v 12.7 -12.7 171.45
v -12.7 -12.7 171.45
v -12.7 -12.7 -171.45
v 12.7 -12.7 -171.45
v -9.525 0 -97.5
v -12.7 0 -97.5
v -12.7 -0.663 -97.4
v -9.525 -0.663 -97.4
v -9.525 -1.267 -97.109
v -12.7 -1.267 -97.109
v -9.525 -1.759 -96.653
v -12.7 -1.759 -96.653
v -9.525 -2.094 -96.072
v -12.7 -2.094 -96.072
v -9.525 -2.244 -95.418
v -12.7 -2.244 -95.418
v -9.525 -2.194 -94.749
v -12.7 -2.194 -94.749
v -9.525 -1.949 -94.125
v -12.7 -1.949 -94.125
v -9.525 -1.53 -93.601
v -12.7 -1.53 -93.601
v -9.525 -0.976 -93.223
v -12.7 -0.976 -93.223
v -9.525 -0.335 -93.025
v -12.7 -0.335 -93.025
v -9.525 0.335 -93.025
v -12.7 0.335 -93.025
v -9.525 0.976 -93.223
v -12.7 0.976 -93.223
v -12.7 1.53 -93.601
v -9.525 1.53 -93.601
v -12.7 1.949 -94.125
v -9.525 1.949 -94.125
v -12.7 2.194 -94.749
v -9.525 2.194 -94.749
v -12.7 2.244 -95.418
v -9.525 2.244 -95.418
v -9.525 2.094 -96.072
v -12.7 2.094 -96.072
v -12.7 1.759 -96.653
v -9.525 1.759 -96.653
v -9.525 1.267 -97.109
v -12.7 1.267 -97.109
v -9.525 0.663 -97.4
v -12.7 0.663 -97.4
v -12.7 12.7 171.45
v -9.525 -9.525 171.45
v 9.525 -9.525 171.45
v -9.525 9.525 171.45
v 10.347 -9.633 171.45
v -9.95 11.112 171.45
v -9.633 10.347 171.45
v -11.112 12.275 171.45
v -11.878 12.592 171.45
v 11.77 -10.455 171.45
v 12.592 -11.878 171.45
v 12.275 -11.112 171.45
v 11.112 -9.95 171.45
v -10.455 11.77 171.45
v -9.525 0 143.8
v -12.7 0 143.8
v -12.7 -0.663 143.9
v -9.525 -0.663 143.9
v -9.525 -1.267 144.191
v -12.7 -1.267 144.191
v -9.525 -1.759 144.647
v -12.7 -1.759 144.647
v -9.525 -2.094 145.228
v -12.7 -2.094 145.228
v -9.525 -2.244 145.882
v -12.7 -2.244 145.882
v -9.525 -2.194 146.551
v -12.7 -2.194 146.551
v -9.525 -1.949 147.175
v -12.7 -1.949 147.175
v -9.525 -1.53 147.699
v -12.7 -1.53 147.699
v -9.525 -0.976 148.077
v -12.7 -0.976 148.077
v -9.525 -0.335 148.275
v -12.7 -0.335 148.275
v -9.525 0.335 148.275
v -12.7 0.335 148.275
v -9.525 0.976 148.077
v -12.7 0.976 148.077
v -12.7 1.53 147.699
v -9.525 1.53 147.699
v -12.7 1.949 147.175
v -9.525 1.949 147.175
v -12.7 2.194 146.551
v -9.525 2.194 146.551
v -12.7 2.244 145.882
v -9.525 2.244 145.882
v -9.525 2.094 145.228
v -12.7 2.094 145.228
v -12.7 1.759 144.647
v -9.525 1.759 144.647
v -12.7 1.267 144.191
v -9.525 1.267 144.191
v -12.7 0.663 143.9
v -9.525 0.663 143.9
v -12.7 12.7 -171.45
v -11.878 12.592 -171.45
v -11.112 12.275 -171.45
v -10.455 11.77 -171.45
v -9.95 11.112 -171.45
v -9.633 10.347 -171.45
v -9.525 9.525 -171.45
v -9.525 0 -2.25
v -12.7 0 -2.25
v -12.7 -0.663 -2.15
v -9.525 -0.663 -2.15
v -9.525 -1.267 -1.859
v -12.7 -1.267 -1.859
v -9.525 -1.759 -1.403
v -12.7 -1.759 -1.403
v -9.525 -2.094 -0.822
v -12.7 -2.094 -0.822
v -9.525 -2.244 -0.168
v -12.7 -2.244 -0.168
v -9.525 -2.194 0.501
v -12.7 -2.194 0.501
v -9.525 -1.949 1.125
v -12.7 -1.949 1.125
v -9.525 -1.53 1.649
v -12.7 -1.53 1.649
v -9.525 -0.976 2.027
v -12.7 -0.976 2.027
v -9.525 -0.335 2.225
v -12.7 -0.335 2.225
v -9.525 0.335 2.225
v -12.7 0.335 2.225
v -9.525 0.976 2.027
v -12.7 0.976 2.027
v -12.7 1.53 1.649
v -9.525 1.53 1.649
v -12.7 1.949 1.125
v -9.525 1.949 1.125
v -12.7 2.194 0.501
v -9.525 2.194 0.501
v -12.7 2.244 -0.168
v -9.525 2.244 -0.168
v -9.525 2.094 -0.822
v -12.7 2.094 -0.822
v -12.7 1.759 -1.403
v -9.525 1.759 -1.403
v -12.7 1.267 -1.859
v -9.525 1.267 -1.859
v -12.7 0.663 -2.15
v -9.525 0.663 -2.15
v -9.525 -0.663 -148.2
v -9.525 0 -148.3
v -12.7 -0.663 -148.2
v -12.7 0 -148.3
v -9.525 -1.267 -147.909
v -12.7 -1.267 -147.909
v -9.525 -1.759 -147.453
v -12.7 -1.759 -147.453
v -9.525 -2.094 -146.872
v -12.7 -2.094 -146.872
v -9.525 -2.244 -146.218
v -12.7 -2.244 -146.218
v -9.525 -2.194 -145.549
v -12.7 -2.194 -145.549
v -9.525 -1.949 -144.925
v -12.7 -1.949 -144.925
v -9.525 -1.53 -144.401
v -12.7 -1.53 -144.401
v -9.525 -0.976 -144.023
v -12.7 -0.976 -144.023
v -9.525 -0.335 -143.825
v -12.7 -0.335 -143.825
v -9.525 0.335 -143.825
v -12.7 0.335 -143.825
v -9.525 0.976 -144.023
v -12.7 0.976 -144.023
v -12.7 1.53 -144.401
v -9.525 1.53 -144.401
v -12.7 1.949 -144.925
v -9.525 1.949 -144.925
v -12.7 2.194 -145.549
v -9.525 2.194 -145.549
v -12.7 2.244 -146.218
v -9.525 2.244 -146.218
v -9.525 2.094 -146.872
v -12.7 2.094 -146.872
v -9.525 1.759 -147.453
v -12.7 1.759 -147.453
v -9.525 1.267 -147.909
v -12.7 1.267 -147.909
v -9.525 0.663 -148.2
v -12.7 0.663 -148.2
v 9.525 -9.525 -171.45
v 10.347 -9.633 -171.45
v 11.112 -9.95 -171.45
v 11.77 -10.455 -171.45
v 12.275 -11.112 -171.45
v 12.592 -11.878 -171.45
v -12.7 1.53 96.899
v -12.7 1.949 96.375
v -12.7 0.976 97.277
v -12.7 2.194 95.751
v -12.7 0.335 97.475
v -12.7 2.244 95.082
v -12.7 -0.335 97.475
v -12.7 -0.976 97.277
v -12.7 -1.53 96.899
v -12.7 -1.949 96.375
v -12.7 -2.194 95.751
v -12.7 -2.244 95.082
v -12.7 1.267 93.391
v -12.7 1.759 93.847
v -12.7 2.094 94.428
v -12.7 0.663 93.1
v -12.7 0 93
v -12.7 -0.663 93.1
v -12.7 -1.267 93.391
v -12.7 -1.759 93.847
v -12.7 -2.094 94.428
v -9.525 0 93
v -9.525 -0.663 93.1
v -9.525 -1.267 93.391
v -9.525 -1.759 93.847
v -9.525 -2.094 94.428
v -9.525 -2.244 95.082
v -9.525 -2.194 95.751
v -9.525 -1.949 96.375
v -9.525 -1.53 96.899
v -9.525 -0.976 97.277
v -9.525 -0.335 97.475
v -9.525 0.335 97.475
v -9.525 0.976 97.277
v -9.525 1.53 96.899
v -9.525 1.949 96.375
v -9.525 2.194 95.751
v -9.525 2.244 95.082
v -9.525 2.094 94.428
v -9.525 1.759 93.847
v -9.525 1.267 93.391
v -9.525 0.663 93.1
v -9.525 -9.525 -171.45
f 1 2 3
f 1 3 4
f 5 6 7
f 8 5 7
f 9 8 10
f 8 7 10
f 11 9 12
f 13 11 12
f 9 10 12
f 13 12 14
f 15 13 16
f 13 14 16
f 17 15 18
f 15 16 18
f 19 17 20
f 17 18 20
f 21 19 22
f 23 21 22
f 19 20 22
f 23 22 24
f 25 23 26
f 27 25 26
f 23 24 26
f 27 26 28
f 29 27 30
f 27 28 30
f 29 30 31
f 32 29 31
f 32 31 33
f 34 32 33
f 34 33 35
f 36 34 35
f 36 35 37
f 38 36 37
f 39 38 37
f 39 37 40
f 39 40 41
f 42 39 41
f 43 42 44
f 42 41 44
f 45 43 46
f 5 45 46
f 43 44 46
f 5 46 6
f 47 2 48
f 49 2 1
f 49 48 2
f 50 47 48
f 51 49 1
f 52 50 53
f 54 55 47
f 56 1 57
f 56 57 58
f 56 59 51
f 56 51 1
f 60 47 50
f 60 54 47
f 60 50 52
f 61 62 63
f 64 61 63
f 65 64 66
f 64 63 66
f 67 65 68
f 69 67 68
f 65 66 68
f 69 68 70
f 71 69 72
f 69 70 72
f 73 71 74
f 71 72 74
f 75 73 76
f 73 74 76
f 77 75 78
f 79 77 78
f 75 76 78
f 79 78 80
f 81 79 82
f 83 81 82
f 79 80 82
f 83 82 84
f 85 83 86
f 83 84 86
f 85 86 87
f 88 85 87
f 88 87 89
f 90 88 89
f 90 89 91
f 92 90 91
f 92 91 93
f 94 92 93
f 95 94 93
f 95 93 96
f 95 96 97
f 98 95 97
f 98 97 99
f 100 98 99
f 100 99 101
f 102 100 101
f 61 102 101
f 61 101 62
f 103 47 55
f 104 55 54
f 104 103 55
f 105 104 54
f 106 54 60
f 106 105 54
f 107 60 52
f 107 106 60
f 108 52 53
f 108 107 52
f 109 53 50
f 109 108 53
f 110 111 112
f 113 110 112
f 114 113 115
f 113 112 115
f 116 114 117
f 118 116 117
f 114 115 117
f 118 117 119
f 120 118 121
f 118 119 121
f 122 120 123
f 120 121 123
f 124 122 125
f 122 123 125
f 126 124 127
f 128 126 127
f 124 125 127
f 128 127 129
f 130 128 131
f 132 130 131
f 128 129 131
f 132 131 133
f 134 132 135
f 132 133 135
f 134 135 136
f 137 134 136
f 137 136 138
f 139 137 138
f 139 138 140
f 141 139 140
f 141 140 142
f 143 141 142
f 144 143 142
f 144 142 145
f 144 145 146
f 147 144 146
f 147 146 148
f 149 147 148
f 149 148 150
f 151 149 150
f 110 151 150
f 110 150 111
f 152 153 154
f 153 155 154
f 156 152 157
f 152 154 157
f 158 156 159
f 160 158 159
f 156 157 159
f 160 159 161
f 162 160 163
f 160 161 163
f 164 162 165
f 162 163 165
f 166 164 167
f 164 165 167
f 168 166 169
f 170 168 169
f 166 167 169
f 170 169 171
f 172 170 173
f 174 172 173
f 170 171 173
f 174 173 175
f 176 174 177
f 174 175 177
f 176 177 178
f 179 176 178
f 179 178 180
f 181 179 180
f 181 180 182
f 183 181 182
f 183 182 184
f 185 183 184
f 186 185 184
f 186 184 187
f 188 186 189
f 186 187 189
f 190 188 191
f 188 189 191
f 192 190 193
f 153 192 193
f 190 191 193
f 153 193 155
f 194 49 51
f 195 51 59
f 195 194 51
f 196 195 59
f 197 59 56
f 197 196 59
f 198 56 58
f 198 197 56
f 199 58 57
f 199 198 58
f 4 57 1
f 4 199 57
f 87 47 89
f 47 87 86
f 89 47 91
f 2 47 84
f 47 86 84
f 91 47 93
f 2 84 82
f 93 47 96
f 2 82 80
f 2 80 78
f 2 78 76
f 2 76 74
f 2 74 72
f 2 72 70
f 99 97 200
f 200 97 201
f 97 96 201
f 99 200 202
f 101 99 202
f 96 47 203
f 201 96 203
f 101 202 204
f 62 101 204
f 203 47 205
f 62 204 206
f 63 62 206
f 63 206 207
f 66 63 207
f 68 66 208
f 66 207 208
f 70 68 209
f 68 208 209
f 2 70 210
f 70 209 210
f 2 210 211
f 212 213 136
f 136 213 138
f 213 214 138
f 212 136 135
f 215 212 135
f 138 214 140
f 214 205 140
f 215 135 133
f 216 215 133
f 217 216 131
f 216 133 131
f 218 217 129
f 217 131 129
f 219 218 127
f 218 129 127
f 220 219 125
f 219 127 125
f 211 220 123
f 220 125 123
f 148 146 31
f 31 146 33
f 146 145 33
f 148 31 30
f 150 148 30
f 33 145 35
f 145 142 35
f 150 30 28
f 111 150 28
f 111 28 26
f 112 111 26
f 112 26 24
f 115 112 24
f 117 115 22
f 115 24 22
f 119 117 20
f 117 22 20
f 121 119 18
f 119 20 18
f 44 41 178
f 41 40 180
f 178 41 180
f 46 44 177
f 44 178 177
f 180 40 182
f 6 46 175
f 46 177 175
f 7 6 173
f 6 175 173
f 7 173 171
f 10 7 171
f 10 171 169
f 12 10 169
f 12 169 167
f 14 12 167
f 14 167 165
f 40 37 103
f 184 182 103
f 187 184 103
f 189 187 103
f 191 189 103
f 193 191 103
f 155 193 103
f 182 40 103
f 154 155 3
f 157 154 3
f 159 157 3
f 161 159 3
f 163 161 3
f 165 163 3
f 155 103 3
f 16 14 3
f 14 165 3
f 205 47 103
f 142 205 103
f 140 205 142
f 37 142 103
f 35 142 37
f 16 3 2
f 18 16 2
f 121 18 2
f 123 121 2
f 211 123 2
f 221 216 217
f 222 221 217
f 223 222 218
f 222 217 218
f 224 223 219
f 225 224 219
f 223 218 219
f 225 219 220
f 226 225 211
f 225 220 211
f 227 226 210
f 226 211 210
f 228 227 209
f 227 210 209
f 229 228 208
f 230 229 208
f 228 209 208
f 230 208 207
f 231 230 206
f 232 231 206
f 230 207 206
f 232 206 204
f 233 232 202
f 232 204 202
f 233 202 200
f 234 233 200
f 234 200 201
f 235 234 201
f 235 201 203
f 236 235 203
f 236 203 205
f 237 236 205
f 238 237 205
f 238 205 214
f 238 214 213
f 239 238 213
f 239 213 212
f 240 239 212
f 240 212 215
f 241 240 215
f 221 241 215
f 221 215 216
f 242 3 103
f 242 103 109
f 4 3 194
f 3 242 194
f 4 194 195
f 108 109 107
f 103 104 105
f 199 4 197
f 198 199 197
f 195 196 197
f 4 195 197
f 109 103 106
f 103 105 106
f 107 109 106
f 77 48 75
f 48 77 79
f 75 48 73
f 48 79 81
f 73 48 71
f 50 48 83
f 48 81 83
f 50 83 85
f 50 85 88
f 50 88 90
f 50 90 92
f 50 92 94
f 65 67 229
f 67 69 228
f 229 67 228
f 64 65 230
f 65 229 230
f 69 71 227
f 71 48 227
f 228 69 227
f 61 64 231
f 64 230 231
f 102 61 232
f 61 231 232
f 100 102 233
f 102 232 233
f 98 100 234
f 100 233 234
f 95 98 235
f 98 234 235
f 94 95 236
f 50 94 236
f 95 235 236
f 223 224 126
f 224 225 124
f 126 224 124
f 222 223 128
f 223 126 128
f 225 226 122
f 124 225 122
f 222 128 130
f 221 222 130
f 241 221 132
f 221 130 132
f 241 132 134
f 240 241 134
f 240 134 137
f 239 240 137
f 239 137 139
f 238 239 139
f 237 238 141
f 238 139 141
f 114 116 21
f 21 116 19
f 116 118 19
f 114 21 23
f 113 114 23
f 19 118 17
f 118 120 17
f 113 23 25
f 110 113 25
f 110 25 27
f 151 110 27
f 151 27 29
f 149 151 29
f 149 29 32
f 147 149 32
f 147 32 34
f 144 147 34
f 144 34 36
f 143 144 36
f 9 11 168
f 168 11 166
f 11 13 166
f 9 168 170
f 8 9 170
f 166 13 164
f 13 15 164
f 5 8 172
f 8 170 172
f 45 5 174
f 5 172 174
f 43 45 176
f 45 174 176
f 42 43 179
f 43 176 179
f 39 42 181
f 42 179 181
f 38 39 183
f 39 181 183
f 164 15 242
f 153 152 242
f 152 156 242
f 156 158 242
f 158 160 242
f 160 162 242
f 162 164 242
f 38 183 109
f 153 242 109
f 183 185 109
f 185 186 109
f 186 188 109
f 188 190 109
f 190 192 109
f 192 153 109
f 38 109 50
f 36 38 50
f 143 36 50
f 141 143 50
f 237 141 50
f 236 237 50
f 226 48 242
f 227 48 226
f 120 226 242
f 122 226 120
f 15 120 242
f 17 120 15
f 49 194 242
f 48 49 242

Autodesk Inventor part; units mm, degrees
ref_plane "YZ Plane" through (0, 0, 0) normal (1, 0, 0) x (0, 1, 0)
ref_plane "XZ Plane" through (0, 0, 0) normal (0, 1, 0) x (-1, 0, 0)
ref_plane "XY Plane" through (0, 0, 0) normal (0, 0, 1) x (1, 0, 0)
sketch "Sketch1" plane through (0, 0, 0) normal (0, 0, 1) x (1, 0, 0)
  line L0 (-12.7, -12.7) -> (12.7, -12.7)
  line L1 (12.7, -12.7) -> (12.7, 12.7)
  line L2 (12.7, 12.7) -> (-12.7, 12.7)
  line L3 (-12.7, 12.7) -> (-12.7, -12.7)
  line L4 (-9.525, 9.525) -> (9.525, 9.525)
  line L5 (9.525, 9.525) -> (9.525, -9.525)
  line L6 (9.525, -9.525) -> (-9.525, -9.525)
  line L7 (-9.525, -9.525) -> (-9.525, 9.525)
  arc A0 (-9.525, 9.525) -> (-12.7, 12.7) centre (-12.7, 9.525) ccw
  arc A1 (12.7, -12.7) -> (9.525, -9.525) centre (9.525, -12.7) ccw
  point P0 (0, 0)
  point P1 (-12.7, 0)
  point P2 (0, 12.7)
  dimension "d0" = 25.4
  dimension "d1" = 25.4
  dimension "d2" = 3.175
extrude "Extrusion1" add sketch "Sketch1" along normal mid plane 342.9 contours L3 A0 L7 L6 A1 L0
sketch "Sketch2" plane through (-9.525, -9.525, 171.45) normal (1, 0, 0) x (0, 0, -1)
  line L0 (342.9, -3.175) -> (0, -3.175) projected
  line L1 (0, 22.225) -> (0, -3.175) projected
  line L2 (342.9, 22.225) -> (0, 22.225) projected
  line L3 (342.9, -3.175) -> (342.9, 22.225) projected
  line L4 (0, 9.525) -> (342.9, 9.525)
  point P0 (171.45, 9.525)
  point P1 (25.4, 9.525)
  point P2 (76.2, 9.525)
  point P3 (171.45, 9.525)
  point P4 (266.7, 9.525)
  point P5 (317.5, 9.525)
  dimension "d5" = 12.7
  dimension "d6" = 25.4
  dimension "d7" = 50.8
  dimension "d8" = 25.4
  dimension "d9" = 50.8
hole "Hole1" at (-9.525, 0, 146.05) at (-9.525, 0, 95.25) at (-9.525, 0, 0) at (-9.525, 0, -95.25) at (-9.525, 0, -146.05) direction (-1, 0, 0) diameter 4.5 depth 12.446 tip angle 118 clearance for "Flat Head Machine Screw (82)" size "#8" standard "Ansi Unified Screw Threads"
equation "\"d8\" = d6"
equation "\"d9\" = d7"
properties part number "1213_Angle Stock Bracket_V1" material "Aluminum"
